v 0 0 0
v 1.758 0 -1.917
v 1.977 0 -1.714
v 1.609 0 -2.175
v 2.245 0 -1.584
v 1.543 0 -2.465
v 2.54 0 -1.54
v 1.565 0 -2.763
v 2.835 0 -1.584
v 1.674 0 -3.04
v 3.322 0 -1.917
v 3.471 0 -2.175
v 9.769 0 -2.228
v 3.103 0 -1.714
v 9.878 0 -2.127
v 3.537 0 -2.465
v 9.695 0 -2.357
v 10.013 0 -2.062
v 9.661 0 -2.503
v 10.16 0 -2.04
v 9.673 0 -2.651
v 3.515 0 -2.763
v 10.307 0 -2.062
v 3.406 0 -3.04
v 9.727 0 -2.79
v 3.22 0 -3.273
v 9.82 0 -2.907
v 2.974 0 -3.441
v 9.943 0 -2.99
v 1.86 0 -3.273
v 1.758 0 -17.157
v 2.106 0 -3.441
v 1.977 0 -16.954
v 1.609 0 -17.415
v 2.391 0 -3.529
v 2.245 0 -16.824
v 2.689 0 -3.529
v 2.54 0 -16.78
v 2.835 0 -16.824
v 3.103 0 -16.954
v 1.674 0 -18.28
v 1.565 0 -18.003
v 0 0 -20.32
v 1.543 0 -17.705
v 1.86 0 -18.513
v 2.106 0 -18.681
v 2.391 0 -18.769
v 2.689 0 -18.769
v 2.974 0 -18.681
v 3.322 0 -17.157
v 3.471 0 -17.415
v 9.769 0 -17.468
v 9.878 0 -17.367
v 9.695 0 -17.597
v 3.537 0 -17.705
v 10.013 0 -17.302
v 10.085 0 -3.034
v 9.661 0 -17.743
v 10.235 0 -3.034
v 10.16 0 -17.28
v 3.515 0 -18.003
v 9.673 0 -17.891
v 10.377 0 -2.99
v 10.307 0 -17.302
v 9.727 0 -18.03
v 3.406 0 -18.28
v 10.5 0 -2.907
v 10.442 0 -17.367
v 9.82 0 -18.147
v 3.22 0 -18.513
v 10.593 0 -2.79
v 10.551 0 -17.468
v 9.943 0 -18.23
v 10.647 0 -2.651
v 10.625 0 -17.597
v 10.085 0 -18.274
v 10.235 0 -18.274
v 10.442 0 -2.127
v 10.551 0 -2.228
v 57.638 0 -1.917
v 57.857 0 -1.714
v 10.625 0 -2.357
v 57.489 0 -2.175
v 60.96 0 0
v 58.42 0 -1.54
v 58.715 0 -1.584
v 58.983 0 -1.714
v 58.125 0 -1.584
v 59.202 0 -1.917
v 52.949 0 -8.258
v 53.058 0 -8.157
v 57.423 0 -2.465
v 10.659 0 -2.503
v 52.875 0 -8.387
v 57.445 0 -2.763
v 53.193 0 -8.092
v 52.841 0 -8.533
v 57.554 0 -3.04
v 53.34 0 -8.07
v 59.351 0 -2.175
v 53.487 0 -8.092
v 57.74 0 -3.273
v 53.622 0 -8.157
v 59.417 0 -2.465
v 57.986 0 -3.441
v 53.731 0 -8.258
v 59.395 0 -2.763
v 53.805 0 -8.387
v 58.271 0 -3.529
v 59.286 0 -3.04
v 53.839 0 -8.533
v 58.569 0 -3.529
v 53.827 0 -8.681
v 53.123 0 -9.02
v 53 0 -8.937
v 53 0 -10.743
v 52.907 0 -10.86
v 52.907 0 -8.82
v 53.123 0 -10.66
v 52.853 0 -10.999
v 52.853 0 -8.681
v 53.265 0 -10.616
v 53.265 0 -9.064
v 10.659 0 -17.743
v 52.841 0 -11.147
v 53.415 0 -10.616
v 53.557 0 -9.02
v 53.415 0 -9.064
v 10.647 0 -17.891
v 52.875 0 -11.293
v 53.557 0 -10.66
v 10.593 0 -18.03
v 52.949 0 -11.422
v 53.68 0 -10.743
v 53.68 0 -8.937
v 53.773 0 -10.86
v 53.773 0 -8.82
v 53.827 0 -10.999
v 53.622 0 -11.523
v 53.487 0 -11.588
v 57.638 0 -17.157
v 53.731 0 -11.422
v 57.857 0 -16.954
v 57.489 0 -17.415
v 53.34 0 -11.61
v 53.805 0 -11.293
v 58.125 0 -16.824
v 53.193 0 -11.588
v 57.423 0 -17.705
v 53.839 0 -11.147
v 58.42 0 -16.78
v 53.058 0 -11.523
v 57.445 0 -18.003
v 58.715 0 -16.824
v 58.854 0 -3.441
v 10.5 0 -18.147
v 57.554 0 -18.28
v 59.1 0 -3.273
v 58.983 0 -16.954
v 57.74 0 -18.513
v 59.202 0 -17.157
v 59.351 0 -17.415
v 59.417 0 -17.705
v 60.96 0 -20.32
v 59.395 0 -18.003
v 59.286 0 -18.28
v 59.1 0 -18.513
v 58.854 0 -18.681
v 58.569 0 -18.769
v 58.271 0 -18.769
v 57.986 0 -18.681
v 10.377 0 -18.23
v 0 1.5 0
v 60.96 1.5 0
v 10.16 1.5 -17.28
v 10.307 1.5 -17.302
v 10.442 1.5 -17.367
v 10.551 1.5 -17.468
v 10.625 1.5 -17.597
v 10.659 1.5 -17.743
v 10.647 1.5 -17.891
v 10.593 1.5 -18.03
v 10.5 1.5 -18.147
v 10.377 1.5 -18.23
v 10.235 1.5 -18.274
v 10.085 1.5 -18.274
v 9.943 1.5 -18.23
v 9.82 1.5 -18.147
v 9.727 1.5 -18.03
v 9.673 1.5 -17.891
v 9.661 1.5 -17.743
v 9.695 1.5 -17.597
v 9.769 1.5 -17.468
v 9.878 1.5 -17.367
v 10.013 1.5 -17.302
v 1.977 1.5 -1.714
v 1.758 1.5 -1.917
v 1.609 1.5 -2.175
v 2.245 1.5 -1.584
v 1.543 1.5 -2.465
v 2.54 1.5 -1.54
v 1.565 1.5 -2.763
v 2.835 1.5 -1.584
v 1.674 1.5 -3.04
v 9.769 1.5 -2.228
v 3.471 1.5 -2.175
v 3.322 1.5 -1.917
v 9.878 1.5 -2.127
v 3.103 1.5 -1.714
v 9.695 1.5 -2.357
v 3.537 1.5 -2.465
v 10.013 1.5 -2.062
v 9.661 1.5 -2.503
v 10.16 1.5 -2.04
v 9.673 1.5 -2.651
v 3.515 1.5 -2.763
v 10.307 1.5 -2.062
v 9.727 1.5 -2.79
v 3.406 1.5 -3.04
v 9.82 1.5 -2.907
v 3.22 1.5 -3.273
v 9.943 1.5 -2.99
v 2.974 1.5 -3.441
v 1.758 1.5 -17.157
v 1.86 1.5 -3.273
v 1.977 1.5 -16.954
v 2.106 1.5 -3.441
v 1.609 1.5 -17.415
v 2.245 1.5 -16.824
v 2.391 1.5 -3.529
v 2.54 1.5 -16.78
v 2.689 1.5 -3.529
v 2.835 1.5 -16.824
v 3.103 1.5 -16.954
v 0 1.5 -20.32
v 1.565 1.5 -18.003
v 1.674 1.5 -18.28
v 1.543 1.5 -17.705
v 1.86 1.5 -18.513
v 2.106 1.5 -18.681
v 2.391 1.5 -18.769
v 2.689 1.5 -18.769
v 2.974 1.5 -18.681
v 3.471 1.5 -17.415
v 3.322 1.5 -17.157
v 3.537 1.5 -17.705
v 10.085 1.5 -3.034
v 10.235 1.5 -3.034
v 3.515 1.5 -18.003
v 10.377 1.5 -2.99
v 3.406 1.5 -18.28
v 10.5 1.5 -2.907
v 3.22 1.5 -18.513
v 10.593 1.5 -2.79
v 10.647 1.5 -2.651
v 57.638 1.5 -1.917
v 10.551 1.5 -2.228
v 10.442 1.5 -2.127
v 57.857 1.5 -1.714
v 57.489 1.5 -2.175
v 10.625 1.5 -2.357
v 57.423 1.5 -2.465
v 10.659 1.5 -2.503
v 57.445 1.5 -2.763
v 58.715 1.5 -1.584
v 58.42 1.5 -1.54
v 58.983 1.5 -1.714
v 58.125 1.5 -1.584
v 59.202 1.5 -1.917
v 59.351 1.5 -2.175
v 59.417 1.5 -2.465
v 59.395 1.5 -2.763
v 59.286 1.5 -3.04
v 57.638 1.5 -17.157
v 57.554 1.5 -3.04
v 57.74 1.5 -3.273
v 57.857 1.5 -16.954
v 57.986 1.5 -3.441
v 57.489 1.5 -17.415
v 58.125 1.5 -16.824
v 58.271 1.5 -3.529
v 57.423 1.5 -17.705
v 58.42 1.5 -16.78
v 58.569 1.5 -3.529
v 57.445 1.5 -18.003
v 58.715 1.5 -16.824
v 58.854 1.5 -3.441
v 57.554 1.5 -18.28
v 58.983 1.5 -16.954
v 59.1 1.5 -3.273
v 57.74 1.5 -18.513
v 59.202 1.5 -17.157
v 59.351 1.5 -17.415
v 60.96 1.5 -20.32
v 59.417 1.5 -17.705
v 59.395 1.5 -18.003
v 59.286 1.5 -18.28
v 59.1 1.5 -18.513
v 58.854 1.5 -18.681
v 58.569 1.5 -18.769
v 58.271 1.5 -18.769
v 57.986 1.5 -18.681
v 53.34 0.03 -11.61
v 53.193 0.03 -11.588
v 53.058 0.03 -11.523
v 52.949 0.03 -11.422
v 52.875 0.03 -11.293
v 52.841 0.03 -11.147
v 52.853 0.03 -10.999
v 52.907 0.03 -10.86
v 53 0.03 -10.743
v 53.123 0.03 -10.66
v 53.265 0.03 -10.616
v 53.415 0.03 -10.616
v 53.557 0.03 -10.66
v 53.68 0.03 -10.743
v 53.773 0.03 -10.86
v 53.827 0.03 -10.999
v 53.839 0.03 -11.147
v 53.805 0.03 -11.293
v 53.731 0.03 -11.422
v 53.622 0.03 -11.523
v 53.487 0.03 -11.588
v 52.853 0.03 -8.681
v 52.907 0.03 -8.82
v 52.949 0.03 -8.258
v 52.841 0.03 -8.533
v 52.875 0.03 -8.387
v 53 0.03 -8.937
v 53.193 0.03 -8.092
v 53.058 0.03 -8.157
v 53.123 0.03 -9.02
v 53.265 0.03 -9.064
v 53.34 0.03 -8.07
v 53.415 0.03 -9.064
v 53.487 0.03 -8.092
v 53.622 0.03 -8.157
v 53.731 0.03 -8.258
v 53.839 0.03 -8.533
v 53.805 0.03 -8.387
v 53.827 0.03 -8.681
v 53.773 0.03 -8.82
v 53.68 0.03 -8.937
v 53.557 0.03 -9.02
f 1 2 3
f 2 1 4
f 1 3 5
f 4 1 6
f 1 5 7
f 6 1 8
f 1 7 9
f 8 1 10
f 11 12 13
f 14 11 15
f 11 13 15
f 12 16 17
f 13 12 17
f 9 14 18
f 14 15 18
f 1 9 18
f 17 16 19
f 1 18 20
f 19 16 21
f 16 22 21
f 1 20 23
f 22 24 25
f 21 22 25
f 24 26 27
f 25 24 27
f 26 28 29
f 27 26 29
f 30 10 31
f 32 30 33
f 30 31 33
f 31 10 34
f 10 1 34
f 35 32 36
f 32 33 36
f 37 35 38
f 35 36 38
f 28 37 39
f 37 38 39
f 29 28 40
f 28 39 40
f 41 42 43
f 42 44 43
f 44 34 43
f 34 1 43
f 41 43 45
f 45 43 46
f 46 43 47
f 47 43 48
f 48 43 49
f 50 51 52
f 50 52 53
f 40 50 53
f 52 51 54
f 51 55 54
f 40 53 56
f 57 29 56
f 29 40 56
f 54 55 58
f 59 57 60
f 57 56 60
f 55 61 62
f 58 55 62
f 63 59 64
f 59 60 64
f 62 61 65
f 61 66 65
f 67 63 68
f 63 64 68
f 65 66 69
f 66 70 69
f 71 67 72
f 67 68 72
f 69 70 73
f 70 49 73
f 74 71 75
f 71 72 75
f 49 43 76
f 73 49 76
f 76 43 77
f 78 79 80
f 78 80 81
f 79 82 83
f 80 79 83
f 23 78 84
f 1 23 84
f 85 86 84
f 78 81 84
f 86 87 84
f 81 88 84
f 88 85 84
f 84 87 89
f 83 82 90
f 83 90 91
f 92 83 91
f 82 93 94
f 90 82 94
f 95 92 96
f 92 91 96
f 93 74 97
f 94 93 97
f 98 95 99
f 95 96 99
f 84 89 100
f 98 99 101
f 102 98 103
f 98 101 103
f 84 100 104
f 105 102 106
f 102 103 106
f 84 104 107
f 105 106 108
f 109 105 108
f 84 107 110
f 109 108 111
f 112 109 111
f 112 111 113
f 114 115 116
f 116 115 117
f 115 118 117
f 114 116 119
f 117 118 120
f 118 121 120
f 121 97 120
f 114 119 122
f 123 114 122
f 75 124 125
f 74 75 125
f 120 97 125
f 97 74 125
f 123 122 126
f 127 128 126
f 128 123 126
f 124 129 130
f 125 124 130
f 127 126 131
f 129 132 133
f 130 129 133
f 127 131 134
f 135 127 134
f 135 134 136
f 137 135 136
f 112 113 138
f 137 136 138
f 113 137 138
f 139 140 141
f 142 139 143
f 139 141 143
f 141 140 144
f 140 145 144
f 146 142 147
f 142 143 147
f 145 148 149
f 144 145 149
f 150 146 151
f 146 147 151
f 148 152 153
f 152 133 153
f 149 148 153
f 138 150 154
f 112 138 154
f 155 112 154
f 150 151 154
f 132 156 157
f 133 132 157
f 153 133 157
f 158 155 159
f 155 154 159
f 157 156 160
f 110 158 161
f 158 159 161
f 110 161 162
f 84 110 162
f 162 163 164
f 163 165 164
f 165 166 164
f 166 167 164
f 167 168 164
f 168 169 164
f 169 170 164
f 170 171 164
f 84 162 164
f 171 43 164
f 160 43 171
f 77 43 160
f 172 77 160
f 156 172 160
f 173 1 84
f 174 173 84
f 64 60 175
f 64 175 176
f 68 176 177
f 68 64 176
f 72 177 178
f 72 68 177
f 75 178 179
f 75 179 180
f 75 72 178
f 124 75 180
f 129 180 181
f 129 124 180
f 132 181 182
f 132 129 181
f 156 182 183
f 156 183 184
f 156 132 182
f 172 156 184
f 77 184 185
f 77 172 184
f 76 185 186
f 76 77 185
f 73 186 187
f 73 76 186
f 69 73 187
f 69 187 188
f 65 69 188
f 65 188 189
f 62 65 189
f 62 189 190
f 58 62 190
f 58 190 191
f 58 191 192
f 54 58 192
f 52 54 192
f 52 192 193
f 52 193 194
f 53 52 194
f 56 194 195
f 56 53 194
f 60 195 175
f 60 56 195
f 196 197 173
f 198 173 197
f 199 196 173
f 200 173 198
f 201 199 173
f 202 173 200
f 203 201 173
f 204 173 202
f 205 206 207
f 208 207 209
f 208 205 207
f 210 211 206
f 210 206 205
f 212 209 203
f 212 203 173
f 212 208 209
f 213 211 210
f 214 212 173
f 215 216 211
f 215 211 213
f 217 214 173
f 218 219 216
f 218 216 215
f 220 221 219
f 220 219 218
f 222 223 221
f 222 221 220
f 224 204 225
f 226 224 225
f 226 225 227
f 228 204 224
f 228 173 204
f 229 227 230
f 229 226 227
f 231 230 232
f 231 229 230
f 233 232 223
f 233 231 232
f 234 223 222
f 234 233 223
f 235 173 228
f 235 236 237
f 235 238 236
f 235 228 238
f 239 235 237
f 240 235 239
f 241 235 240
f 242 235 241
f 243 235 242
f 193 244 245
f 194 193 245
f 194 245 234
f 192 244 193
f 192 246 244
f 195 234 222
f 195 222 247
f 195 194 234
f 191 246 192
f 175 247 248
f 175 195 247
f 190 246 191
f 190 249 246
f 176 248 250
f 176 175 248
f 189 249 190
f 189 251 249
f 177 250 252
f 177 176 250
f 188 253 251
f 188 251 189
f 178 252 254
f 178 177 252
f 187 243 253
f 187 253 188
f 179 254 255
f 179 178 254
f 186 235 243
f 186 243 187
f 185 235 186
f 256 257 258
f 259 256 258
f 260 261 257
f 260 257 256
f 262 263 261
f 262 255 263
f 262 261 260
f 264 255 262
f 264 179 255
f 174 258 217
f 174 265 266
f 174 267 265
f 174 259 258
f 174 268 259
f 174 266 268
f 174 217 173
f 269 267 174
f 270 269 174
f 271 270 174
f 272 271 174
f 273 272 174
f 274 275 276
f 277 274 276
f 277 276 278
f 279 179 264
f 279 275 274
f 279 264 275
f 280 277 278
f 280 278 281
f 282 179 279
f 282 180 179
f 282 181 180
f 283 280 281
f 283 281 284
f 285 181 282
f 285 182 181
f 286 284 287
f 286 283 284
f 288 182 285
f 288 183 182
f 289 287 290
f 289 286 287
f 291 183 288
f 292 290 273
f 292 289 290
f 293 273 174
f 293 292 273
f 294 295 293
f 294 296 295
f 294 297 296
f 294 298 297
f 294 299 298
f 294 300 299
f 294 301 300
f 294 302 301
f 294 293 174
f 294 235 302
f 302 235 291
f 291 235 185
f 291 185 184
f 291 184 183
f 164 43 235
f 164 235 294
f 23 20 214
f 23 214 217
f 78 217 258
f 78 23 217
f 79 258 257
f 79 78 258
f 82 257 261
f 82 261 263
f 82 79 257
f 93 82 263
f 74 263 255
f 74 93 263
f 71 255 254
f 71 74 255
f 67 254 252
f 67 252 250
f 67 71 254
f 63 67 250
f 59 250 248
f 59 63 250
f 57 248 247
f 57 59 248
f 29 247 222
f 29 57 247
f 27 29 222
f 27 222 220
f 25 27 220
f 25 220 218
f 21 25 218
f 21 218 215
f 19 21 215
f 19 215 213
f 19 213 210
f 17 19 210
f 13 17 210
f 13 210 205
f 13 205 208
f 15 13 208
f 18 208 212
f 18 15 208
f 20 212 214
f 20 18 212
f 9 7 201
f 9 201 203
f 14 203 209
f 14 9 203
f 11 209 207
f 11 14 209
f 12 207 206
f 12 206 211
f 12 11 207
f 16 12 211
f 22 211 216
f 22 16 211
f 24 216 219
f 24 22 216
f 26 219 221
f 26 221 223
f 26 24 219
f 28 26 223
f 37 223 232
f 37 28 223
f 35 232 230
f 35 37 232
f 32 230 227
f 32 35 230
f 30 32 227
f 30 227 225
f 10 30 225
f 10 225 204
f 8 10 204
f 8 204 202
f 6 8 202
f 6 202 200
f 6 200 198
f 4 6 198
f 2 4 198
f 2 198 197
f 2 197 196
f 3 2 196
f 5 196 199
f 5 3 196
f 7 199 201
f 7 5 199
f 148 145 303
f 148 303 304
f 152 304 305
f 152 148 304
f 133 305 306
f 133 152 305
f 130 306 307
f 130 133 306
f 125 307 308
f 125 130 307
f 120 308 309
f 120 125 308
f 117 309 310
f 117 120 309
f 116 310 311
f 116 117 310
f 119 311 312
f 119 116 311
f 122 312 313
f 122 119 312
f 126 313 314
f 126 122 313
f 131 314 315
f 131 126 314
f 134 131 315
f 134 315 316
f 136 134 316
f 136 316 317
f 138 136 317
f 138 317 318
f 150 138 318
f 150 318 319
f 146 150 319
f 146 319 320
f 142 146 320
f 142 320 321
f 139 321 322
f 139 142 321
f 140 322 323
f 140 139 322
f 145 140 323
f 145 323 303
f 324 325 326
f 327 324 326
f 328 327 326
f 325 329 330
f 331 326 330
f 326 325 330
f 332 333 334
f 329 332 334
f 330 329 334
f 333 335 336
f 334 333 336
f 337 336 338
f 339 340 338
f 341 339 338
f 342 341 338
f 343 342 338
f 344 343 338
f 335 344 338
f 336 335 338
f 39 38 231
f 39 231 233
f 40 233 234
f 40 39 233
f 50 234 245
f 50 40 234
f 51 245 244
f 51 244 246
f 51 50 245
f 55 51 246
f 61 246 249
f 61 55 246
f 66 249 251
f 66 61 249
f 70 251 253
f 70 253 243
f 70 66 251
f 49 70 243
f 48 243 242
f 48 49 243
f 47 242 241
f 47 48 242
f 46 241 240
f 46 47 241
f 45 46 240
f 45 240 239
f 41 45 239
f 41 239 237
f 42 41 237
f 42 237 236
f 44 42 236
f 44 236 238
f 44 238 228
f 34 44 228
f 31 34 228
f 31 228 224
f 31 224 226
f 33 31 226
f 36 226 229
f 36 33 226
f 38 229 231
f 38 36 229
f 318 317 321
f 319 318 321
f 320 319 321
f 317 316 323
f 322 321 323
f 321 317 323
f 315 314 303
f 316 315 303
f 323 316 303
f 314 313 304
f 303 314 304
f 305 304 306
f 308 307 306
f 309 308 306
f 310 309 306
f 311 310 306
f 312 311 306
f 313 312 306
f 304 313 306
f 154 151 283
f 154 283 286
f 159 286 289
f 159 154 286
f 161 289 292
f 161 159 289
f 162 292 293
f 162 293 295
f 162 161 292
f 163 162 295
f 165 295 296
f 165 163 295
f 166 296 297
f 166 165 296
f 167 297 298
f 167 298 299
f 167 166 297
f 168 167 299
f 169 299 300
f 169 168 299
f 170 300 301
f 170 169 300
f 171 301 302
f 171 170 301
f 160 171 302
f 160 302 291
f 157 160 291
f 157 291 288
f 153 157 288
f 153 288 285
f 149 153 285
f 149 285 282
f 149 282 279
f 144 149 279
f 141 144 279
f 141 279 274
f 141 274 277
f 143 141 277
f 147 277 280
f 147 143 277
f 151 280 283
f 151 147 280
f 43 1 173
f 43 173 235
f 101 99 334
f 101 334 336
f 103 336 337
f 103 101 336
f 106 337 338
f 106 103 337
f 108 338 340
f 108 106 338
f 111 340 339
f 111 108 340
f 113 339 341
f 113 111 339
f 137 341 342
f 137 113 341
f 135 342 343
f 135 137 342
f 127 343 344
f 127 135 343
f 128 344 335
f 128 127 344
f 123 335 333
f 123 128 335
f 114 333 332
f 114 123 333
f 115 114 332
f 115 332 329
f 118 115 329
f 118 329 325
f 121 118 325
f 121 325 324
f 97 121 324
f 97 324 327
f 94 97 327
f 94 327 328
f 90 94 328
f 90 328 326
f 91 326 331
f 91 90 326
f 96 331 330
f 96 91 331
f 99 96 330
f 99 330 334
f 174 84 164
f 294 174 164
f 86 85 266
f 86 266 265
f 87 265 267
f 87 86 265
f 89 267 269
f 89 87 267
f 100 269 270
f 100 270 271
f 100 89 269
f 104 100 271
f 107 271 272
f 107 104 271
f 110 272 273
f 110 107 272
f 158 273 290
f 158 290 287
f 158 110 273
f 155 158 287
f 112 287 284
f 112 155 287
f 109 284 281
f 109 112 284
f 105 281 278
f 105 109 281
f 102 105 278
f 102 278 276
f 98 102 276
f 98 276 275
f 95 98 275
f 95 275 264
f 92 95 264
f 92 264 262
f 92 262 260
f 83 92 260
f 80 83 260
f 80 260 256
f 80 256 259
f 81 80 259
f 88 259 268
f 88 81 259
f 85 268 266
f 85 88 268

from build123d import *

# Parameters (mm, degrees)
SKETCH1_W           = 60.96
SKETCH1_H           = 20.32
SKETCH1_R           = 1
SKETCH1_R_2         = 0.5
BOSS_EXTRUDE1_DEPTH = 1.5
SKETCH1_3_R         = 0.5
CUT_EXTRUDE3_DEPTH  = 0.03


with BuildPart() as part:
    # Sketch1 → Boss-Extrude1 (new body)
    with BuildSketch(Plane(origin=(0, 0, 0), x_dir=(1, 0, 0), z_dir=(0, 1, 0))):
        with Locations((30.48, 10.16)):
            Rectangle(SKETCH1_W, SKETCH1_H)
        with Locations(Location((2.54, 2.54, 0), (0, 0, 270))):  # turned: the seam where the file's is
            Circle(SKETCH1_R, mode=Mode.SUBTRACT)
        with Locations(Location((58.42, 2.54, 0), (0, 0, 270))):  # turned: the seam where the file's is
            Circle(SKETCH1_R, mode=Mode.SUBTRACT)
        with Locations(Location((58.42, 17.78, 0), (0, 0, 270))):  # turned: the seam where the file's is
            Circle(SKETCH1_R, mode=Mode.SUBTRACT)
        with Locations(Location((2.54, 17.78, 0), (0, 0, 270))):  # turned: the seam where the file's is
            Circle(SKETCH1_R, mode=Mode.SUBTRACT)
        with Locations(Location((10.16, 2.54, 0), (0, 0, 270))):  # turned: the seam where the file's is
            Circle(SKETCH1_R_2, mode=Mode.SUBTRACT)
        with Locations(Location((10.16, 17.78, 0), (0, 0, 270))):  # turned: the seam where the file's is
            Circle(SKETCH1_R_2, mode=Mode.SUBTRACT)
    extrude(amount=BOSS_EXTRUDE1_DEPTH)

    # Sketch1_3 → Cut-Extrude3 (cut)
    with BuildSketch(Plane(origin=(0, 0, 0), x_dir=(1, 0, 0), z_dir=(0, 1, 0))):
        with Locations(Location((53.34, 8.57, 0), (0, 0, 270))):  # turned: the seam where the file's is
            Circle(SKETCH1_3_R)
        with Locations(Location((53.34, 11.11, 0), (0, 0, 90))):  # turned: the seam where the file's is
            Circle(SKETCH1_3_R)
    extrude(amount=CUT_EXTRUDE3_DEPTH, mode=Mode.SUBTRACT)


solid = part.part
